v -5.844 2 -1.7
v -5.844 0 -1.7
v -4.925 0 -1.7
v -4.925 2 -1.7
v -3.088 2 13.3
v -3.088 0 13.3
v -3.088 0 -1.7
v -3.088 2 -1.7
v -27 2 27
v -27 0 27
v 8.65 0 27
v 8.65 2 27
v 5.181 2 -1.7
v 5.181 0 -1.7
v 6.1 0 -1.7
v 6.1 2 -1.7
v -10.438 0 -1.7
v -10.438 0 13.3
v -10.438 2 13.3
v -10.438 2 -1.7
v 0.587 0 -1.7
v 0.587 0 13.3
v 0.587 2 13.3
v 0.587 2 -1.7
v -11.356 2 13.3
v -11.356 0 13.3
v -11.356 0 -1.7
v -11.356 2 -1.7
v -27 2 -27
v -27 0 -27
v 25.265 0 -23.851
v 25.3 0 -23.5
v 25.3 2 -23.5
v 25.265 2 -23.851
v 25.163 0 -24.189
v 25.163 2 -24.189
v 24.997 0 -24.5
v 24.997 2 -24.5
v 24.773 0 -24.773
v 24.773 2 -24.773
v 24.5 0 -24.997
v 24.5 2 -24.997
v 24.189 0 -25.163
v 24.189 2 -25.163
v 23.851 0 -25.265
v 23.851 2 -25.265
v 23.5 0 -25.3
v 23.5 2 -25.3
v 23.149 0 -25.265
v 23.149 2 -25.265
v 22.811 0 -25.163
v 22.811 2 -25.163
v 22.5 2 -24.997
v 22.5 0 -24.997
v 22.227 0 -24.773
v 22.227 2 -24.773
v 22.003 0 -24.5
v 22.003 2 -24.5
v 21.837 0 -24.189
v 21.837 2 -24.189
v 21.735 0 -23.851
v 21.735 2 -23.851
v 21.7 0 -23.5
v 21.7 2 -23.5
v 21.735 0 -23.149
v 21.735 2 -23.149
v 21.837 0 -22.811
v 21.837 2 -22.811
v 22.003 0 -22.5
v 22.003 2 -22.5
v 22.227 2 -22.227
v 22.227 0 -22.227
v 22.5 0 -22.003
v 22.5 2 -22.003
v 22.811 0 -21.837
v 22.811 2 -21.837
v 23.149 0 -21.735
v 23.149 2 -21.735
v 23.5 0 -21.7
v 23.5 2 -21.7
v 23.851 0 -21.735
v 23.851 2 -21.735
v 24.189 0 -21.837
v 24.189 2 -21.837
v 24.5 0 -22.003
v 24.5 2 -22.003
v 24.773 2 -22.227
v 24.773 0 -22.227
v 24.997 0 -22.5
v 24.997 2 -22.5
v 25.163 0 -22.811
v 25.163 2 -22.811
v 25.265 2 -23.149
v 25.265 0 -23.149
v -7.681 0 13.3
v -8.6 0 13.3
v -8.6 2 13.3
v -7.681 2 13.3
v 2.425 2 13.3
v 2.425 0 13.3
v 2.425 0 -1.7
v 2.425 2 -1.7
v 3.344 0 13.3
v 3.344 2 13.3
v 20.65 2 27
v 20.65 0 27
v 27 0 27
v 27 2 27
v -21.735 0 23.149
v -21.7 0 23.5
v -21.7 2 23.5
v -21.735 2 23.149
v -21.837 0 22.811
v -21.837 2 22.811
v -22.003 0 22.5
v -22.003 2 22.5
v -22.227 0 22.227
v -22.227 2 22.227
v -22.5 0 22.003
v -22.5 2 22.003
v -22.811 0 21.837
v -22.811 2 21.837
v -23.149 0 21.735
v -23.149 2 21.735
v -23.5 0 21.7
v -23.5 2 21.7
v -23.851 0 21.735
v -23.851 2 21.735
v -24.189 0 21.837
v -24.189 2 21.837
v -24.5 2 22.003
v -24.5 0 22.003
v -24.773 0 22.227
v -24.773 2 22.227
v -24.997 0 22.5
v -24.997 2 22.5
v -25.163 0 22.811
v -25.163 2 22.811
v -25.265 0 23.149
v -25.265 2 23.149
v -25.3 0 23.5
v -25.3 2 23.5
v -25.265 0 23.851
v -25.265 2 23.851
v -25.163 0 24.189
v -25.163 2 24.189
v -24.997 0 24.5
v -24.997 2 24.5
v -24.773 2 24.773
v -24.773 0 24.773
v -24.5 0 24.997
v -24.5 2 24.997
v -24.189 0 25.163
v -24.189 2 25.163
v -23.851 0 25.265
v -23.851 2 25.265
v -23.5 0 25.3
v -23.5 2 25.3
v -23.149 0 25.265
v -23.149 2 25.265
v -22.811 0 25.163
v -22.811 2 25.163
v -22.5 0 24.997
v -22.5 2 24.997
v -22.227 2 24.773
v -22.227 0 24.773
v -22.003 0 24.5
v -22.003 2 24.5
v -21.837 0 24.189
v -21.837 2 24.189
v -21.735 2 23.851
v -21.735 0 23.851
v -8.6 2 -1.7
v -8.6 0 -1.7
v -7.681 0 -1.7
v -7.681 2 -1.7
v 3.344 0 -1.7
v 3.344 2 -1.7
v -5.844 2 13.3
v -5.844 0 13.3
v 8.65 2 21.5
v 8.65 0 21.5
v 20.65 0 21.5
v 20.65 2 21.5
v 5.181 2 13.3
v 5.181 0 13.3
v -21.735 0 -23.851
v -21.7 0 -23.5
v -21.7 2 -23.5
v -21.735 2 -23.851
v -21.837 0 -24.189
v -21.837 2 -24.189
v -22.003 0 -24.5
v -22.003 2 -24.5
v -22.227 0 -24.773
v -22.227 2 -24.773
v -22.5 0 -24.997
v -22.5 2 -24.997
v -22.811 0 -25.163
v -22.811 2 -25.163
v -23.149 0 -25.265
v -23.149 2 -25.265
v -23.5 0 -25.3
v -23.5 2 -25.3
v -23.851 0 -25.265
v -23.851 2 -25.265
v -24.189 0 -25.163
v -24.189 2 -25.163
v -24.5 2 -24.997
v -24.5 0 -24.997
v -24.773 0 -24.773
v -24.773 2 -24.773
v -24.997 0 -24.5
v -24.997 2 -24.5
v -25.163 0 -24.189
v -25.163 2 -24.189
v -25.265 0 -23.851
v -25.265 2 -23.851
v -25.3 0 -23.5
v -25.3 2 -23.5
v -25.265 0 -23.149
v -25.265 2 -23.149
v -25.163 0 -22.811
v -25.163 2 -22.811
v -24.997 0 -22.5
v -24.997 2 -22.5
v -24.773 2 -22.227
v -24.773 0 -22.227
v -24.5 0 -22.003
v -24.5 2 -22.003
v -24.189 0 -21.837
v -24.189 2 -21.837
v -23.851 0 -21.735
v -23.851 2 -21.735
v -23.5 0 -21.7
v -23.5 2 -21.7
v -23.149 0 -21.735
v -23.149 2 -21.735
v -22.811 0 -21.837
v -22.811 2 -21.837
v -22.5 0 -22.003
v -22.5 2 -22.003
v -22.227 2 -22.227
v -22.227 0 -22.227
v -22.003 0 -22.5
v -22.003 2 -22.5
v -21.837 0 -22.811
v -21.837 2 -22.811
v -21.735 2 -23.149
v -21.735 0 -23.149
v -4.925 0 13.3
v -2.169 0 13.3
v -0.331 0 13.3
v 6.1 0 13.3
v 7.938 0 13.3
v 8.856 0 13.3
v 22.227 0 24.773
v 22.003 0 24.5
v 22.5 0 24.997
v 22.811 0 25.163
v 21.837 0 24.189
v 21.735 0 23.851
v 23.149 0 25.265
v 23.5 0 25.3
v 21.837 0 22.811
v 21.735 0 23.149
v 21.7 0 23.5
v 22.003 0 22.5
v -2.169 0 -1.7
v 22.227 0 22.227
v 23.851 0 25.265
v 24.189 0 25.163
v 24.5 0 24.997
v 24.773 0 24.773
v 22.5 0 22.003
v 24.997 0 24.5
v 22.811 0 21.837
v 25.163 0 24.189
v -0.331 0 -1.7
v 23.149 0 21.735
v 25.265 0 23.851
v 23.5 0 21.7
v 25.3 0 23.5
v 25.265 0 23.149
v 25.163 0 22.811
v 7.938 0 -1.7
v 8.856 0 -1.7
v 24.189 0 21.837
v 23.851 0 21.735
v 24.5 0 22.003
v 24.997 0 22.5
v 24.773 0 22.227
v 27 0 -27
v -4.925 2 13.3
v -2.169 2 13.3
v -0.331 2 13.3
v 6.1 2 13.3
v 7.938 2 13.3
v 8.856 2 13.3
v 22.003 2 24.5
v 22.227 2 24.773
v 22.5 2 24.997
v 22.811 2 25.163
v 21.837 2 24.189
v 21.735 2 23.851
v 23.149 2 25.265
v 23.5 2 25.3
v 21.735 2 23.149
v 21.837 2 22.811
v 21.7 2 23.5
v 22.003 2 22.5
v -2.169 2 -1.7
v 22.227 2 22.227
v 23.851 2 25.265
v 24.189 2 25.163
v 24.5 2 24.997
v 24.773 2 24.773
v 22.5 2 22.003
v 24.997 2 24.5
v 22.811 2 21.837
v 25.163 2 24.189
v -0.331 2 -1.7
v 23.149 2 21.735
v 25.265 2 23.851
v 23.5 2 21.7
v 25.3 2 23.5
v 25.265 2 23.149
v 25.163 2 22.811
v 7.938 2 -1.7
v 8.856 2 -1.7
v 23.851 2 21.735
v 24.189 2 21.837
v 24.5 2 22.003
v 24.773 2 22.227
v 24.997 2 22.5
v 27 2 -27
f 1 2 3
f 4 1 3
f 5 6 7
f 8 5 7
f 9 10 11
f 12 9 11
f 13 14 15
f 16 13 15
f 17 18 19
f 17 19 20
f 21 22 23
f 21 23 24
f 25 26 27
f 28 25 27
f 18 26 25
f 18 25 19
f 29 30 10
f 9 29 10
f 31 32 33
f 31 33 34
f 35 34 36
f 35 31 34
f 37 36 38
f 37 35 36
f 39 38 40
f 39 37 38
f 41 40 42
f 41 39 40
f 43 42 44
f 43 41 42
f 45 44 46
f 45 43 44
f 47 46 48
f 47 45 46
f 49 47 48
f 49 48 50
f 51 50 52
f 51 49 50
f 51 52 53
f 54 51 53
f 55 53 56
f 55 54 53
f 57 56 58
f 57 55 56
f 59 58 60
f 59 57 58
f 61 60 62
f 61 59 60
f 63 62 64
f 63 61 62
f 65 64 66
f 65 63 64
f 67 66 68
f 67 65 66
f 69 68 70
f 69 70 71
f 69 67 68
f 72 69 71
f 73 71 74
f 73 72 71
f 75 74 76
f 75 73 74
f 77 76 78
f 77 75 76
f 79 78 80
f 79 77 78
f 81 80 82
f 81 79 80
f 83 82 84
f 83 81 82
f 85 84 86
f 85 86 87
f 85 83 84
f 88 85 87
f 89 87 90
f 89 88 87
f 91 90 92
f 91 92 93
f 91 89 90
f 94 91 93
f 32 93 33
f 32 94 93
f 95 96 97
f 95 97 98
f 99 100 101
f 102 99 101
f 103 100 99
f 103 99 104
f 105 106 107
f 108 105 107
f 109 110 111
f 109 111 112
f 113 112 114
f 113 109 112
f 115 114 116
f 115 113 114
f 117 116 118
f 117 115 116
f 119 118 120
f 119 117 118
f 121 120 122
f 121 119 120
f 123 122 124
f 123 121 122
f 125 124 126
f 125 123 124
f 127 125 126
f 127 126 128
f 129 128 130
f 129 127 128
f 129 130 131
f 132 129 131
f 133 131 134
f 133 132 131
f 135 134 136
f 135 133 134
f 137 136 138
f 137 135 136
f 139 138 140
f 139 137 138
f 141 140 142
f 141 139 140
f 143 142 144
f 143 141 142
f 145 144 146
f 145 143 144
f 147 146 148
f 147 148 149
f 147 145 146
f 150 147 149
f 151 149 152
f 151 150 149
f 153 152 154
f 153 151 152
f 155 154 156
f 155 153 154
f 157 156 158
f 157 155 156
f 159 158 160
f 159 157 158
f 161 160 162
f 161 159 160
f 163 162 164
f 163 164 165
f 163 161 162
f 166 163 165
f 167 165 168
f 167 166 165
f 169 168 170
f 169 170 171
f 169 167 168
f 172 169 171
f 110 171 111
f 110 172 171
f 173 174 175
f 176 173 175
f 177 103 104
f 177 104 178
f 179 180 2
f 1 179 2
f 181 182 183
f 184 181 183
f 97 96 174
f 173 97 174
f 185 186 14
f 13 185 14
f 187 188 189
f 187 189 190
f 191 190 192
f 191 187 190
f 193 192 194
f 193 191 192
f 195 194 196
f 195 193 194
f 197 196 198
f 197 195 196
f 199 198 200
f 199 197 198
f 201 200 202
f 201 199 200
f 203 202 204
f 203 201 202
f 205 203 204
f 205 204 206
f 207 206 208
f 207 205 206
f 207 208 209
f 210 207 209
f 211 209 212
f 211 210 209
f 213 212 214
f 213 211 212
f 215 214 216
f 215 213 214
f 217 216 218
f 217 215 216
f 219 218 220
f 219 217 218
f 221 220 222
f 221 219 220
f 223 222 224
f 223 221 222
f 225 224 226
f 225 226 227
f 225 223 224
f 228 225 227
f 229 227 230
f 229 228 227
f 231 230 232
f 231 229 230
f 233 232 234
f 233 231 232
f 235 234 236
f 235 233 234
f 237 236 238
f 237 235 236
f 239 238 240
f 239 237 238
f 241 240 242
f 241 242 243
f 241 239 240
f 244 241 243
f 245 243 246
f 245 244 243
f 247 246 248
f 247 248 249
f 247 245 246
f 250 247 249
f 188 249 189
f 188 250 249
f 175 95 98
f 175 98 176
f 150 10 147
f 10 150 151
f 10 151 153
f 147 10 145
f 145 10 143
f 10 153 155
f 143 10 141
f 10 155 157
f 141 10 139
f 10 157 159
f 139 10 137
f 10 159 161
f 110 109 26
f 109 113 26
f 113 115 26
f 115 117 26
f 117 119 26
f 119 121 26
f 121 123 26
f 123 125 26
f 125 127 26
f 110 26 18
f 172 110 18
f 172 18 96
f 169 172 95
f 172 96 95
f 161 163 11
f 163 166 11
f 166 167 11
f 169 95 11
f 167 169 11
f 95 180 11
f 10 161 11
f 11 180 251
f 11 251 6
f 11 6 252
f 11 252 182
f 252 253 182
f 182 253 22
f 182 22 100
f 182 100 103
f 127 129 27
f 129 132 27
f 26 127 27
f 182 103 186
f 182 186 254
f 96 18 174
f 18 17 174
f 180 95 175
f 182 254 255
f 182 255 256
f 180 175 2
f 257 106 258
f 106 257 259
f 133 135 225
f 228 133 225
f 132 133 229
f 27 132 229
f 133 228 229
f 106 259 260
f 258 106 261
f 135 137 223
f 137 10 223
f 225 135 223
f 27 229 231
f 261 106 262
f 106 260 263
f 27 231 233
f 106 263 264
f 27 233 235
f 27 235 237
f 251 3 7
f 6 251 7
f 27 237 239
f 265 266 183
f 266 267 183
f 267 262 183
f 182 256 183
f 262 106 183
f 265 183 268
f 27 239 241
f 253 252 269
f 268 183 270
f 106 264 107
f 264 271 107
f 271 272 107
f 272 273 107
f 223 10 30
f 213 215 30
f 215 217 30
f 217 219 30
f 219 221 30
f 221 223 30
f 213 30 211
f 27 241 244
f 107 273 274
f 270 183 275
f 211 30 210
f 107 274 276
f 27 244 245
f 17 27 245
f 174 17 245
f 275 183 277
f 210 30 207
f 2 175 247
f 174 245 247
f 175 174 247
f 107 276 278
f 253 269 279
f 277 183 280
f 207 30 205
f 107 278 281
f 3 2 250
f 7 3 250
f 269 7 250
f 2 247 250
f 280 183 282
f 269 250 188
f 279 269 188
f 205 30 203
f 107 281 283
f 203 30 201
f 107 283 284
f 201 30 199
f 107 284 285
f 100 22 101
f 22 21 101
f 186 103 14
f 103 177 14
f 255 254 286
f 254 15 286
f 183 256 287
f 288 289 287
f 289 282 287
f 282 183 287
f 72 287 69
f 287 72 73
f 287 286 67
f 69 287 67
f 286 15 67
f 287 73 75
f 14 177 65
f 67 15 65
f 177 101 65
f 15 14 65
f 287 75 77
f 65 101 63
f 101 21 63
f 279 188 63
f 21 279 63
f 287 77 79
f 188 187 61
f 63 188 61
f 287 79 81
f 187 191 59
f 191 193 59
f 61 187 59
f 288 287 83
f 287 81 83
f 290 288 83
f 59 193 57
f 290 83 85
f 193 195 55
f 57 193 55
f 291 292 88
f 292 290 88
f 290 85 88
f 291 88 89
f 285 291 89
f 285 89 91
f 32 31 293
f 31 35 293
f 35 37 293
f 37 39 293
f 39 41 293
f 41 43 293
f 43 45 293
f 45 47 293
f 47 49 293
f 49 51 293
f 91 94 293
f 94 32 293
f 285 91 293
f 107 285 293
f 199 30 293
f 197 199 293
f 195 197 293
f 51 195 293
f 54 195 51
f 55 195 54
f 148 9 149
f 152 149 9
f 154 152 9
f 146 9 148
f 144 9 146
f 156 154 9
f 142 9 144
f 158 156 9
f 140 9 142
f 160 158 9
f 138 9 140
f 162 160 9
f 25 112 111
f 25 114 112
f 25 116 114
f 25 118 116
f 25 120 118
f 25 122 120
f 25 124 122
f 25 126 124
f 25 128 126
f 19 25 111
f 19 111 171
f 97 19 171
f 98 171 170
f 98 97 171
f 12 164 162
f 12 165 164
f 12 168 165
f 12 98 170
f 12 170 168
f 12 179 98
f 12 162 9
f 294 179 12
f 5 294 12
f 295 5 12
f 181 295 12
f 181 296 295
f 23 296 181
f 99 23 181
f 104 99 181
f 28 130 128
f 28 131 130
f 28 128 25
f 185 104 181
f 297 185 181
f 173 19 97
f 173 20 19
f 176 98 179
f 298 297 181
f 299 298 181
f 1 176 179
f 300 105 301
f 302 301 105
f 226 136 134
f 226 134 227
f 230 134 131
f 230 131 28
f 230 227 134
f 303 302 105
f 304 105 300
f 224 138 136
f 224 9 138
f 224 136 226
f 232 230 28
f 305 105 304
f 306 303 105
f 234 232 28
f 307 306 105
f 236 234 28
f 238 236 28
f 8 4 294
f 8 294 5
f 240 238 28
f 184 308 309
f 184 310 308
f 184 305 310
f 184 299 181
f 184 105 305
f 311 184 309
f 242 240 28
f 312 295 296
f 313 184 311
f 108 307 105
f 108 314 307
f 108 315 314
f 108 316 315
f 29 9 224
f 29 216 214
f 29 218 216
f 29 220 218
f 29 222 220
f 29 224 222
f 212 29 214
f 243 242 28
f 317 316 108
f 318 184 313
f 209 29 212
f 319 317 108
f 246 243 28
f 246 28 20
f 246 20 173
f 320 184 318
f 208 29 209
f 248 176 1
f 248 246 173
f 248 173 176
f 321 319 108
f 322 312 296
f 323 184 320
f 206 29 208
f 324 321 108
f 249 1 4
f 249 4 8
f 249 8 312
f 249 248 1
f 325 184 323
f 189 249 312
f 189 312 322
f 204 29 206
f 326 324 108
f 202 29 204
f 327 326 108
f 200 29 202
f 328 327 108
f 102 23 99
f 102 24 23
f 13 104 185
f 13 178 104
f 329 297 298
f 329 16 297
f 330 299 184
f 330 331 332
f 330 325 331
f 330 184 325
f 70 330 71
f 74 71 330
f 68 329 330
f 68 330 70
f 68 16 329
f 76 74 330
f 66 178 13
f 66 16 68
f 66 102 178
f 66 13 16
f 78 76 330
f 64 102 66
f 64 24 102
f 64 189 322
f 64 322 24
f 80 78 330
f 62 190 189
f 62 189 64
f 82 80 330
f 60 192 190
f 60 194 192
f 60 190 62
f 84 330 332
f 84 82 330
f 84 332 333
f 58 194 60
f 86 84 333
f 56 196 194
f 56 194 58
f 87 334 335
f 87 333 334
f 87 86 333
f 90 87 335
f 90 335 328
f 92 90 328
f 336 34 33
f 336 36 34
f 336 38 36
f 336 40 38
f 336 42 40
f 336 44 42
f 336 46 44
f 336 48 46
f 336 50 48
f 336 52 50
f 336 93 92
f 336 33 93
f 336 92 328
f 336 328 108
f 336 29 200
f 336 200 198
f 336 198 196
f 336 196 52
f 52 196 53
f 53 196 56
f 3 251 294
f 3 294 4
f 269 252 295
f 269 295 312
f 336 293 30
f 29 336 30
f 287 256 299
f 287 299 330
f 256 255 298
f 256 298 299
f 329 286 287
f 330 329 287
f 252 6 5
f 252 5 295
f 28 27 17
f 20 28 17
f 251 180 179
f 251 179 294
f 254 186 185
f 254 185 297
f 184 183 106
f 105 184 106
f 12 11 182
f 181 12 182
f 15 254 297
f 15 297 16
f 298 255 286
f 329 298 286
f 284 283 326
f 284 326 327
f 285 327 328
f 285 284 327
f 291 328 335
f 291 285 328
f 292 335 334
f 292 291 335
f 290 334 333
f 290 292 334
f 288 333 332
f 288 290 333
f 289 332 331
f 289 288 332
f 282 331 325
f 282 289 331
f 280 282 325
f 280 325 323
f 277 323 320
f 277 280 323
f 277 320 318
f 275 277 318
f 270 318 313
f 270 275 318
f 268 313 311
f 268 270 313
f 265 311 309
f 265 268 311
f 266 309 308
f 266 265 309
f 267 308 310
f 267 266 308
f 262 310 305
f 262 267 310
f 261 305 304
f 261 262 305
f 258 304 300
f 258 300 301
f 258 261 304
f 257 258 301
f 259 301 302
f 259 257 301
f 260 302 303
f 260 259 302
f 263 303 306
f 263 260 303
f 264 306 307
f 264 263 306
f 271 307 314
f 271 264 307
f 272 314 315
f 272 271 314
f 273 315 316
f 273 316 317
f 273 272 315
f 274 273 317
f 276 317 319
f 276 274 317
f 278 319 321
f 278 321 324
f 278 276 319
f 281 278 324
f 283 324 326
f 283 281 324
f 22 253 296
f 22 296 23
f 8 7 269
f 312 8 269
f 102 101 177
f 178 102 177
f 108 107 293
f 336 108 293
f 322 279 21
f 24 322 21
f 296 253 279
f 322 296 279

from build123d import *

# Parameters (mm, degrees)
SKETCH_3_W      = 0.91875
SKETCH_3_H      = 15
SKETCH_3_R      = 1.8
EXTRUDE_2_DEPTH = 2


with BuildPart() as part:
    # 草图3 → 凸台-拉伸2 (new body)
    with BuildSketch(Plane(origin=(0, 0, 0), x_dir=(1, 0, 0), z_dir=(0, 1, 0))):
        Polygon((8.65, -21.5), (20.65, -21.5), (20.65, -27), (27, -27), (27, 27), (-27, 27), (-27, -27), (8.65, -27), align=None)
        with Locations((-10.896875, -5.8)):
            Rectangle(SKETCH_3_W, SKETCH_3_H, mode=Mode.SUBTRACT)
        with Locations((-8.140625, -5.8)):
            Rectangle(SKETCH_3_W, SKETCH_3_H, mode=Mode.SUBTRACT)
        with Locations((-5.384375, -5.8)):
            Rectangle(SKETCH_3_W, SKETCH_3_H, mode=Mode.SUBTRACT)
        with Locations((-2.628125, -5.8)):
            Rectangle(SKETCH_3_W, SKETCH_3_H, mode=Mode.SUBTRACT)
        with Locations((0.128125, -5.8)):
            Rectangle(SKETCH_3_W, SKETCH_3_H, mode=Mode.SUBTRACT)
        with Locations((2.884375, -5.8)):
            Rectangle(SKETCH_3_W, SKETCH_3_H, mode=Mode.SUBTRACT)
        with Locations((5.640625, -5.8)):
            Rectangle(SKETCH_3_W, SKETCH_3_H, mode=Mode.SUBTRACT)
        with Locations((8.396875, -5.8)):
            Rectangle(SKETCH_3_W, SKETCH_3_H, mode=Mode.SUBTRACT)
        with Locations((23.5, 23.5)):
            Circle(SKETCH_3_R, mode=Mode.SUBTRACT)
        with Locations((23.5, -23.5)):
            Circle(SKETCH_3_R, mode=Mode.SUBTRACT)
        with Locations((-23.5, 23.5)):
            Circle(SKETCH_3_R, mode=Mode.SUBTRACT)
        with Locations((-23.5, -23.5)):
            Circle(SKETCH_3_R, mode=Mode.SUBTRACT)
    extrude(amount=EXTRUDE_2_DEPTH)


solid = part.part
